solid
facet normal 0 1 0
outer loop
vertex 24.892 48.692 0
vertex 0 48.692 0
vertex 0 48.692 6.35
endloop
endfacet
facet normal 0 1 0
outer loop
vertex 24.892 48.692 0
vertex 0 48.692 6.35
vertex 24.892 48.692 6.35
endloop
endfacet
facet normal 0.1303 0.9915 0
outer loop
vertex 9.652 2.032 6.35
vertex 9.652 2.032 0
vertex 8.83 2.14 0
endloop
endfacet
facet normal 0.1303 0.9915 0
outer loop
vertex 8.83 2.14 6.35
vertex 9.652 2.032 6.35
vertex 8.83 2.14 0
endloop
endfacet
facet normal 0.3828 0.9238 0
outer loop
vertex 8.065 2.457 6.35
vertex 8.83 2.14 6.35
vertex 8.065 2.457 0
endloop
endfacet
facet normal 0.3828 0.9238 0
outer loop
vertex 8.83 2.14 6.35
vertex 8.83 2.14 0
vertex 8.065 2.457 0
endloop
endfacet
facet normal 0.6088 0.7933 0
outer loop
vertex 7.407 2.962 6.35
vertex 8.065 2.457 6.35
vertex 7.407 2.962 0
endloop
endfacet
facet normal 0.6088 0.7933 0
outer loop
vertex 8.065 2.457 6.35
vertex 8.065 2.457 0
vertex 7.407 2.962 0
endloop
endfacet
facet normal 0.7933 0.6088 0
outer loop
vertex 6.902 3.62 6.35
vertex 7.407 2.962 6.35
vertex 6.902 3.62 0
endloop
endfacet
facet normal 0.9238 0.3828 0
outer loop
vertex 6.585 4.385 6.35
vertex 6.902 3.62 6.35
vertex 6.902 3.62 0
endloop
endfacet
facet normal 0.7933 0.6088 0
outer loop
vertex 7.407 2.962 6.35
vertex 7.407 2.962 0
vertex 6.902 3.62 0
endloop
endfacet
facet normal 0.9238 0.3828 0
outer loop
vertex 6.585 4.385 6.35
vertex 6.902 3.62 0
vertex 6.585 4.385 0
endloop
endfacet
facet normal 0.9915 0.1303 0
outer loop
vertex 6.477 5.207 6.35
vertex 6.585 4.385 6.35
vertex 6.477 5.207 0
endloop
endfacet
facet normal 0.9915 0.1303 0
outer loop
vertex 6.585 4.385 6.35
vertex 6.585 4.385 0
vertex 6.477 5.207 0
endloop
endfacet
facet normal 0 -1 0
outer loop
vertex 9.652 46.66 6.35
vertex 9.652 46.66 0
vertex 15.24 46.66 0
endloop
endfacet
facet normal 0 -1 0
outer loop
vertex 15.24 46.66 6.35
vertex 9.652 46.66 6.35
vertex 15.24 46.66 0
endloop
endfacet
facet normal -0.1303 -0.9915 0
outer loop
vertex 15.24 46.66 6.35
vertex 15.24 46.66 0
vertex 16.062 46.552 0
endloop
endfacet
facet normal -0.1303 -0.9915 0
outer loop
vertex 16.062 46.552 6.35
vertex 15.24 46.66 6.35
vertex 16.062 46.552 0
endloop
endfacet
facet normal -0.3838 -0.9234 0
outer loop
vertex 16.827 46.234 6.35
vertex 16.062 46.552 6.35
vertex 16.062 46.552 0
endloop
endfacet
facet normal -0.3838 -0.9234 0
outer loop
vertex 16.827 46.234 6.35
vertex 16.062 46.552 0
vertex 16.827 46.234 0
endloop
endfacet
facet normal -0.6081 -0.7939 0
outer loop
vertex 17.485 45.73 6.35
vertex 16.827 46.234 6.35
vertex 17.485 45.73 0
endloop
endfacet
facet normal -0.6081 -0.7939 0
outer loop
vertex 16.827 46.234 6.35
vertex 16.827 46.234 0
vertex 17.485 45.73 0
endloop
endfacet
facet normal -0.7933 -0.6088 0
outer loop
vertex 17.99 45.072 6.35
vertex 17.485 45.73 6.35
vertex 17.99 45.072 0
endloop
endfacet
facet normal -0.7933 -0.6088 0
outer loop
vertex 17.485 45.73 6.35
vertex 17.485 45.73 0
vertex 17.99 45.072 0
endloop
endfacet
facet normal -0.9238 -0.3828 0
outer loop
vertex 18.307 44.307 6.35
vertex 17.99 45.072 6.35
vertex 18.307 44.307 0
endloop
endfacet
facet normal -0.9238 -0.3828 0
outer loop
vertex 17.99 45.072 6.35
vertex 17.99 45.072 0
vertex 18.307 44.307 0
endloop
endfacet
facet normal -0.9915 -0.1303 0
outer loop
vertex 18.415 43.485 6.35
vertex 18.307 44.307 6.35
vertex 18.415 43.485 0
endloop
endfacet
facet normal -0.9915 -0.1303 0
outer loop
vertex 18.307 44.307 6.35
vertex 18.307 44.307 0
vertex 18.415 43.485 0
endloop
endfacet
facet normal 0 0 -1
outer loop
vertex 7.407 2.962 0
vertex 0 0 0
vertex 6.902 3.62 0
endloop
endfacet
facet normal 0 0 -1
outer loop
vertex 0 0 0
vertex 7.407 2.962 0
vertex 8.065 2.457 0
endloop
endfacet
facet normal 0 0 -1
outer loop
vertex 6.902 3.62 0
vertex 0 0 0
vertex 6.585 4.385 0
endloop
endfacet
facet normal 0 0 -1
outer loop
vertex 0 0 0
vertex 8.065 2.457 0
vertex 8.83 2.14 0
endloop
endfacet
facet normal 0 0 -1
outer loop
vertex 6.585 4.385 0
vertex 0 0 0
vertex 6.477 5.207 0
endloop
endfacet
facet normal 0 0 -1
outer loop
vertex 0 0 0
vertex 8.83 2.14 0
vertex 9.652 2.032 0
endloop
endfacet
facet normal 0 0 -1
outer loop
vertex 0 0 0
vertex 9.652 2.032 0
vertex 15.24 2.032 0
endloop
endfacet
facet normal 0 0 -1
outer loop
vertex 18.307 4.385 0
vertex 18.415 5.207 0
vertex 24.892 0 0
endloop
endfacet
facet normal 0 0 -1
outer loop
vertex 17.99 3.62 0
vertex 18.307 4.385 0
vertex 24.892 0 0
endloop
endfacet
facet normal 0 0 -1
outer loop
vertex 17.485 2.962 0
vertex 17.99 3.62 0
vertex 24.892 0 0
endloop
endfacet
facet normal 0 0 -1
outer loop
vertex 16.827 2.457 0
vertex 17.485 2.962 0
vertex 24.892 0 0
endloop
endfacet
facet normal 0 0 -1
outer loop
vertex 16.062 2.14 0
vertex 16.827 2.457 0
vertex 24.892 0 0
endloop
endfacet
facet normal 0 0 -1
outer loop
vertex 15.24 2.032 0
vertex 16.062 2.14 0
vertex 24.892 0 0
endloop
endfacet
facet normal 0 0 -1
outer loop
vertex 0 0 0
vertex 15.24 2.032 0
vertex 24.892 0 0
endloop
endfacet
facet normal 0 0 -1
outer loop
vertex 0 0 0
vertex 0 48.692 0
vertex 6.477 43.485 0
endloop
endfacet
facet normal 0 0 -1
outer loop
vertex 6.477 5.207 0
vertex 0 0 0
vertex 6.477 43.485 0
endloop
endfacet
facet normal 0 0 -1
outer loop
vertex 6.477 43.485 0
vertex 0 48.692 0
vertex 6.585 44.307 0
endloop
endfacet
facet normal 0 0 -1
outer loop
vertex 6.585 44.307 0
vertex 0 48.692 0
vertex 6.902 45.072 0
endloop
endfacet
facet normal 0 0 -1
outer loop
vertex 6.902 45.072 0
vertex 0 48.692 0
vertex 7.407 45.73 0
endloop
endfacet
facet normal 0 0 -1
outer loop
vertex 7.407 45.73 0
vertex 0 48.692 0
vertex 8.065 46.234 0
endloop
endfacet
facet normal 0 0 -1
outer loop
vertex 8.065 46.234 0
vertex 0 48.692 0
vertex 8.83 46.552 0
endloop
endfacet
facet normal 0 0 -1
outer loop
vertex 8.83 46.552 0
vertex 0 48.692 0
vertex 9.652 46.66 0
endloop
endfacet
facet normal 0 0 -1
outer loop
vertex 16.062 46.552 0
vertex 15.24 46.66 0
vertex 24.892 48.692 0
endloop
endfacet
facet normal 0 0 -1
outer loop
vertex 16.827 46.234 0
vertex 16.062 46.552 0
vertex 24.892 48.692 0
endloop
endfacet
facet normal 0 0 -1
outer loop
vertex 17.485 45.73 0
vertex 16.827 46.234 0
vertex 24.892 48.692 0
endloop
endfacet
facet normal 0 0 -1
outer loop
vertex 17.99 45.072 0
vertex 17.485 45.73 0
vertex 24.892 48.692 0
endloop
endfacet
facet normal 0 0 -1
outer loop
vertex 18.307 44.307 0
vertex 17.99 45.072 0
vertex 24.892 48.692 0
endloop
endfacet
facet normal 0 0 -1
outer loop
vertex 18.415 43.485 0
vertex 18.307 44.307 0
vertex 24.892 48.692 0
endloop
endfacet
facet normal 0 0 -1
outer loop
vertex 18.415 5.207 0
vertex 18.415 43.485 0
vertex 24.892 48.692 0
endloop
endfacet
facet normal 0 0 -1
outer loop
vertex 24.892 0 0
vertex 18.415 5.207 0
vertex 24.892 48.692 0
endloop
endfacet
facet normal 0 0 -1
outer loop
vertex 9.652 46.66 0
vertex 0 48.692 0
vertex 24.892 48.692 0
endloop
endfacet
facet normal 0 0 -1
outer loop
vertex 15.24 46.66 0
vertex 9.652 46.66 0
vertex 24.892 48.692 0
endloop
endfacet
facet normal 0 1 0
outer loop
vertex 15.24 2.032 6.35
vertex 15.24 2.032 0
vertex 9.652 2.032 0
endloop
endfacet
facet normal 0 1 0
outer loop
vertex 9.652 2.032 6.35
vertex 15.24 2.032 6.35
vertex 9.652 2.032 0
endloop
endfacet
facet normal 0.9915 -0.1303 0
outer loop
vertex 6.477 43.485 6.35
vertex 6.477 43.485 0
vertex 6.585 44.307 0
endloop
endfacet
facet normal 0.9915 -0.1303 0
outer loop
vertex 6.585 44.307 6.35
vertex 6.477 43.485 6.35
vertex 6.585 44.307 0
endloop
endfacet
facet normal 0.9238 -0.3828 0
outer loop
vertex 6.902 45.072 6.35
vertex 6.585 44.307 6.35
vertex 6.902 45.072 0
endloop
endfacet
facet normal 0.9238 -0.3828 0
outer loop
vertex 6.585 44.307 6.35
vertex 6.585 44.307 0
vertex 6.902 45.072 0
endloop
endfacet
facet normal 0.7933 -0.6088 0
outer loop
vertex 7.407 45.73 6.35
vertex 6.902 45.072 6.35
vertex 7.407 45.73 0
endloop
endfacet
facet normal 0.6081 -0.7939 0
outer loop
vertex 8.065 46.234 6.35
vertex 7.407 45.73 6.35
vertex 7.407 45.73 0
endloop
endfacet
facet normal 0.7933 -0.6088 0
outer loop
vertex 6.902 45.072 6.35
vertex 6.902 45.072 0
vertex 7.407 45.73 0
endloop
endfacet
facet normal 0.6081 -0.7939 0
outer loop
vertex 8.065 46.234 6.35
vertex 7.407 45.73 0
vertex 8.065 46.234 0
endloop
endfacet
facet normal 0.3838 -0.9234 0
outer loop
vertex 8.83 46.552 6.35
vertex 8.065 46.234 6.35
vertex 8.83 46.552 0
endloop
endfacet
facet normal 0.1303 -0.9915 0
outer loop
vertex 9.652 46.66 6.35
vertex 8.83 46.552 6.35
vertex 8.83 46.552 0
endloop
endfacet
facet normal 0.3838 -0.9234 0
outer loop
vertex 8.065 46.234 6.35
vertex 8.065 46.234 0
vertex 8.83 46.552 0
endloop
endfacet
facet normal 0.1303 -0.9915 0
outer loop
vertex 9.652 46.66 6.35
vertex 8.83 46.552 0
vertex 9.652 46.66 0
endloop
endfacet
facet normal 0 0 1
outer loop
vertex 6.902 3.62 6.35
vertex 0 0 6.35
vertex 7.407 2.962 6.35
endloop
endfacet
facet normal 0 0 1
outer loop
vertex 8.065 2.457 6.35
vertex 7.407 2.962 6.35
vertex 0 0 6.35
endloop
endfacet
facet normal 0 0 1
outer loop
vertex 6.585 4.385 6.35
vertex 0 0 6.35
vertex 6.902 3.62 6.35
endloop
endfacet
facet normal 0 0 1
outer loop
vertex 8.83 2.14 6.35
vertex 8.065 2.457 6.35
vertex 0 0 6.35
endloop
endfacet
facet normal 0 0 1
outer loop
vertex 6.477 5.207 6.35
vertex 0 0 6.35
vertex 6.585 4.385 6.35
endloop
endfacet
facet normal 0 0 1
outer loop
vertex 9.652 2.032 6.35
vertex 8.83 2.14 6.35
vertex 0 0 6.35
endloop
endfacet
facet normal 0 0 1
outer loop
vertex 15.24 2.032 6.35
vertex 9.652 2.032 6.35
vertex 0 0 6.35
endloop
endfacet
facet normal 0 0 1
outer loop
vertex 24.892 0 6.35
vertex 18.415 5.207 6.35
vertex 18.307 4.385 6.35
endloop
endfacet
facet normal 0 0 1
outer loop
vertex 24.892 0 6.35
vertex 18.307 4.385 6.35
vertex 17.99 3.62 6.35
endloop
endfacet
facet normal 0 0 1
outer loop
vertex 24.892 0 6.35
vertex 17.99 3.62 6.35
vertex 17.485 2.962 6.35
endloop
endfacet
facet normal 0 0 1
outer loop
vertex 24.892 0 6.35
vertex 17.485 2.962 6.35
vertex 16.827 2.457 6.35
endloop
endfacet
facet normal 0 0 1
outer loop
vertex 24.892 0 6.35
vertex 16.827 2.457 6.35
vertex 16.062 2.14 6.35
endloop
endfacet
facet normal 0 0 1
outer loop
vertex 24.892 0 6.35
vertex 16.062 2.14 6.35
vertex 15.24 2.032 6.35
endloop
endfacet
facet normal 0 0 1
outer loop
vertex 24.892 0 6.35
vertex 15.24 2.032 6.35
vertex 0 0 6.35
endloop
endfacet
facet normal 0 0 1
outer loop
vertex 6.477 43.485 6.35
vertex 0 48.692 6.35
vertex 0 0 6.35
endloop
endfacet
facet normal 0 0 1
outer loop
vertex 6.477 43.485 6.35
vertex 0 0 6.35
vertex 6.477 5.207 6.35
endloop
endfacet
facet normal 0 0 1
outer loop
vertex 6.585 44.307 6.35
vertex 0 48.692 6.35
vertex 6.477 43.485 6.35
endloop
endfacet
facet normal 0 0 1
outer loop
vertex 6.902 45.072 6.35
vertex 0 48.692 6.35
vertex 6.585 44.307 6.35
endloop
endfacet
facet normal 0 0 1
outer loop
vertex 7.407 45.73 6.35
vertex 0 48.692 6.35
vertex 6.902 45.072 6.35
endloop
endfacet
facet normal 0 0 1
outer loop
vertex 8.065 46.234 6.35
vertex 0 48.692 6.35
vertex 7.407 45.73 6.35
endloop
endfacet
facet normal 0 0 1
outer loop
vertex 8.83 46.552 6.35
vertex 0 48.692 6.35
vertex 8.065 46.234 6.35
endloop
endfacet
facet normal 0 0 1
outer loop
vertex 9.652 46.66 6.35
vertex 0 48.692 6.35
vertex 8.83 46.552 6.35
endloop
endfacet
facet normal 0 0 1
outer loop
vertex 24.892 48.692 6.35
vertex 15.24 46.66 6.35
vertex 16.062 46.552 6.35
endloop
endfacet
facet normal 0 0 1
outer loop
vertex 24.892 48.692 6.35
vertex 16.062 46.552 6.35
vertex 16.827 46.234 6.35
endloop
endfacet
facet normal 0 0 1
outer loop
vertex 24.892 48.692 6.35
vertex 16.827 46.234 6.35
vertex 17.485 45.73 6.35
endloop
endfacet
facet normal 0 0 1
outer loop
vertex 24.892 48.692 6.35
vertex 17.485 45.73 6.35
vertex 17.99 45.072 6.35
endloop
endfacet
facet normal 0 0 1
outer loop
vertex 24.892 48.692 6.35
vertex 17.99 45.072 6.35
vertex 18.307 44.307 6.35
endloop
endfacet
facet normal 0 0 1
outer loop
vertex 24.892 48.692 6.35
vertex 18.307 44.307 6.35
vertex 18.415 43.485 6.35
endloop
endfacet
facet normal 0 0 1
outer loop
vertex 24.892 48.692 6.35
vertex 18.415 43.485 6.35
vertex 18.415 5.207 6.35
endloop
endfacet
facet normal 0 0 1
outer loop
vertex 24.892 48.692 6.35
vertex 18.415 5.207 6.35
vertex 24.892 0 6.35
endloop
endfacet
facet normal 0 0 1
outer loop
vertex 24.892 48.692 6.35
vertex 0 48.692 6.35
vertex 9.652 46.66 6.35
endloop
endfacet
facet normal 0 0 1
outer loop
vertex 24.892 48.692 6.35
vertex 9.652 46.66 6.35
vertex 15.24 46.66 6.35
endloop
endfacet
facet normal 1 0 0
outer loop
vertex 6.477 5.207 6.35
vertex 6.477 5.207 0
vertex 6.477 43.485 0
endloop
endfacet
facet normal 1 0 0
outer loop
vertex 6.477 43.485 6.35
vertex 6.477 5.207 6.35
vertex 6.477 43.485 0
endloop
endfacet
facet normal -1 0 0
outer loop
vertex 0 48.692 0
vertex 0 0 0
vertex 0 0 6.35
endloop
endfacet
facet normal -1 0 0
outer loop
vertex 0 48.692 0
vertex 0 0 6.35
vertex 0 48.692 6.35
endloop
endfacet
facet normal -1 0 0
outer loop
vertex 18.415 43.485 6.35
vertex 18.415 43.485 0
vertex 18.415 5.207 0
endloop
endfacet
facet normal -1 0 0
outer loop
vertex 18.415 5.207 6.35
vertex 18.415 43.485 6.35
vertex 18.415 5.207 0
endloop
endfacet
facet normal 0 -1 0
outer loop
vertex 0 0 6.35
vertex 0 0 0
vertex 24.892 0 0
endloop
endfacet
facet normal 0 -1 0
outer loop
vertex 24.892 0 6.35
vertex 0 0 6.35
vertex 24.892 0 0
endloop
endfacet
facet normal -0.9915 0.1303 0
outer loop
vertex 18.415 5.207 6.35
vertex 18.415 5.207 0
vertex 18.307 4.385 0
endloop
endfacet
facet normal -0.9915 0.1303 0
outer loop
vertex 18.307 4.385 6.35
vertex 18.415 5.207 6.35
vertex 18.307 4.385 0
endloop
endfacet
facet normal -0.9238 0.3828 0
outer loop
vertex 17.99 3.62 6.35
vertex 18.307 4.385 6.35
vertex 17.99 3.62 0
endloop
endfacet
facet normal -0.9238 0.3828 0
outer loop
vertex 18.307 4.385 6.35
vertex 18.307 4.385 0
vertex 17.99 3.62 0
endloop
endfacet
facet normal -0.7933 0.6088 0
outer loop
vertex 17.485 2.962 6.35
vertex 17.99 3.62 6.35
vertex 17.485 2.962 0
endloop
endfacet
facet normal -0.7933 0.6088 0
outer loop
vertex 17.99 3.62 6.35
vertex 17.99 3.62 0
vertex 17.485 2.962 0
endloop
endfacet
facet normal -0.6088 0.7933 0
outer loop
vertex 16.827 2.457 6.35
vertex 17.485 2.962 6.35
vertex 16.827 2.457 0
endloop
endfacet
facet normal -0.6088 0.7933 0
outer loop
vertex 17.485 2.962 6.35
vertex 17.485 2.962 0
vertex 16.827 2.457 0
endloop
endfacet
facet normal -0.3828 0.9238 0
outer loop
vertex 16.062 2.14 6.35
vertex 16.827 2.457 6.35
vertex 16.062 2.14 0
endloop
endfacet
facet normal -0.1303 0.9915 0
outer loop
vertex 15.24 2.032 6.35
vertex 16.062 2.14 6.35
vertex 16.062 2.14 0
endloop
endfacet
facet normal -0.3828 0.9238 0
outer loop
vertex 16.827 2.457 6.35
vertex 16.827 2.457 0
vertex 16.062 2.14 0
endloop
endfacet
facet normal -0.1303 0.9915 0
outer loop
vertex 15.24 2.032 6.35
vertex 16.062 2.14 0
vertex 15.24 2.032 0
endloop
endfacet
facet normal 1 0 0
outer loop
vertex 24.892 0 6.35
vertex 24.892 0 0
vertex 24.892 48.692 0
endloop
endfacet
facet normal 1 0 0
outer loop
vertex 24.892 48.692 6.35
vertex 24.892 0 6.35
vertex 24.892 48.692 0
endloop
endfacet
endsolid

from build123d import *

# Parameters (mm, degrees)
F0_W     = 24.892
F0_H     = 48.6918
F1_DEPTH = 6.35


with BuildPart() as f1:
    # F0 (on Top) → F1 (new body)
    with BuildSketch(Plane.XY):
        with Locations((12.446, 24.3459)):
            Rectangle(F0_W, F0_H)
        with BuildLine():
            ThreePointArc((6.477, 43.4848), (7.406936, 45.729864), (9.652, 46.6598))
            Line((9.652, 46.6598), (15.24, 46.6598))
            ThreePointArc((15.24, 46.6598), (17.485064, 45.729864), (18.415, 43.4848))
            Line((18.415, 43.4848), (18.415, 5.207))
            ThreePointArc((18.415, 5.207), (17.485064, 2.961936), (15.24, 2.032))
            Line((15.24, 2.032), (9.652, 2.032))
            ThreePointArc((9.652, 2.032), (7.406936, 2.961936), (6.477, 5.207))
            Line((6.477, 5.207), (6.477, 43.4848))
        make_face(mode=Mode.SUBTRACT)
    extrude(amount=F1_DEPTH)


solid = f1.part
